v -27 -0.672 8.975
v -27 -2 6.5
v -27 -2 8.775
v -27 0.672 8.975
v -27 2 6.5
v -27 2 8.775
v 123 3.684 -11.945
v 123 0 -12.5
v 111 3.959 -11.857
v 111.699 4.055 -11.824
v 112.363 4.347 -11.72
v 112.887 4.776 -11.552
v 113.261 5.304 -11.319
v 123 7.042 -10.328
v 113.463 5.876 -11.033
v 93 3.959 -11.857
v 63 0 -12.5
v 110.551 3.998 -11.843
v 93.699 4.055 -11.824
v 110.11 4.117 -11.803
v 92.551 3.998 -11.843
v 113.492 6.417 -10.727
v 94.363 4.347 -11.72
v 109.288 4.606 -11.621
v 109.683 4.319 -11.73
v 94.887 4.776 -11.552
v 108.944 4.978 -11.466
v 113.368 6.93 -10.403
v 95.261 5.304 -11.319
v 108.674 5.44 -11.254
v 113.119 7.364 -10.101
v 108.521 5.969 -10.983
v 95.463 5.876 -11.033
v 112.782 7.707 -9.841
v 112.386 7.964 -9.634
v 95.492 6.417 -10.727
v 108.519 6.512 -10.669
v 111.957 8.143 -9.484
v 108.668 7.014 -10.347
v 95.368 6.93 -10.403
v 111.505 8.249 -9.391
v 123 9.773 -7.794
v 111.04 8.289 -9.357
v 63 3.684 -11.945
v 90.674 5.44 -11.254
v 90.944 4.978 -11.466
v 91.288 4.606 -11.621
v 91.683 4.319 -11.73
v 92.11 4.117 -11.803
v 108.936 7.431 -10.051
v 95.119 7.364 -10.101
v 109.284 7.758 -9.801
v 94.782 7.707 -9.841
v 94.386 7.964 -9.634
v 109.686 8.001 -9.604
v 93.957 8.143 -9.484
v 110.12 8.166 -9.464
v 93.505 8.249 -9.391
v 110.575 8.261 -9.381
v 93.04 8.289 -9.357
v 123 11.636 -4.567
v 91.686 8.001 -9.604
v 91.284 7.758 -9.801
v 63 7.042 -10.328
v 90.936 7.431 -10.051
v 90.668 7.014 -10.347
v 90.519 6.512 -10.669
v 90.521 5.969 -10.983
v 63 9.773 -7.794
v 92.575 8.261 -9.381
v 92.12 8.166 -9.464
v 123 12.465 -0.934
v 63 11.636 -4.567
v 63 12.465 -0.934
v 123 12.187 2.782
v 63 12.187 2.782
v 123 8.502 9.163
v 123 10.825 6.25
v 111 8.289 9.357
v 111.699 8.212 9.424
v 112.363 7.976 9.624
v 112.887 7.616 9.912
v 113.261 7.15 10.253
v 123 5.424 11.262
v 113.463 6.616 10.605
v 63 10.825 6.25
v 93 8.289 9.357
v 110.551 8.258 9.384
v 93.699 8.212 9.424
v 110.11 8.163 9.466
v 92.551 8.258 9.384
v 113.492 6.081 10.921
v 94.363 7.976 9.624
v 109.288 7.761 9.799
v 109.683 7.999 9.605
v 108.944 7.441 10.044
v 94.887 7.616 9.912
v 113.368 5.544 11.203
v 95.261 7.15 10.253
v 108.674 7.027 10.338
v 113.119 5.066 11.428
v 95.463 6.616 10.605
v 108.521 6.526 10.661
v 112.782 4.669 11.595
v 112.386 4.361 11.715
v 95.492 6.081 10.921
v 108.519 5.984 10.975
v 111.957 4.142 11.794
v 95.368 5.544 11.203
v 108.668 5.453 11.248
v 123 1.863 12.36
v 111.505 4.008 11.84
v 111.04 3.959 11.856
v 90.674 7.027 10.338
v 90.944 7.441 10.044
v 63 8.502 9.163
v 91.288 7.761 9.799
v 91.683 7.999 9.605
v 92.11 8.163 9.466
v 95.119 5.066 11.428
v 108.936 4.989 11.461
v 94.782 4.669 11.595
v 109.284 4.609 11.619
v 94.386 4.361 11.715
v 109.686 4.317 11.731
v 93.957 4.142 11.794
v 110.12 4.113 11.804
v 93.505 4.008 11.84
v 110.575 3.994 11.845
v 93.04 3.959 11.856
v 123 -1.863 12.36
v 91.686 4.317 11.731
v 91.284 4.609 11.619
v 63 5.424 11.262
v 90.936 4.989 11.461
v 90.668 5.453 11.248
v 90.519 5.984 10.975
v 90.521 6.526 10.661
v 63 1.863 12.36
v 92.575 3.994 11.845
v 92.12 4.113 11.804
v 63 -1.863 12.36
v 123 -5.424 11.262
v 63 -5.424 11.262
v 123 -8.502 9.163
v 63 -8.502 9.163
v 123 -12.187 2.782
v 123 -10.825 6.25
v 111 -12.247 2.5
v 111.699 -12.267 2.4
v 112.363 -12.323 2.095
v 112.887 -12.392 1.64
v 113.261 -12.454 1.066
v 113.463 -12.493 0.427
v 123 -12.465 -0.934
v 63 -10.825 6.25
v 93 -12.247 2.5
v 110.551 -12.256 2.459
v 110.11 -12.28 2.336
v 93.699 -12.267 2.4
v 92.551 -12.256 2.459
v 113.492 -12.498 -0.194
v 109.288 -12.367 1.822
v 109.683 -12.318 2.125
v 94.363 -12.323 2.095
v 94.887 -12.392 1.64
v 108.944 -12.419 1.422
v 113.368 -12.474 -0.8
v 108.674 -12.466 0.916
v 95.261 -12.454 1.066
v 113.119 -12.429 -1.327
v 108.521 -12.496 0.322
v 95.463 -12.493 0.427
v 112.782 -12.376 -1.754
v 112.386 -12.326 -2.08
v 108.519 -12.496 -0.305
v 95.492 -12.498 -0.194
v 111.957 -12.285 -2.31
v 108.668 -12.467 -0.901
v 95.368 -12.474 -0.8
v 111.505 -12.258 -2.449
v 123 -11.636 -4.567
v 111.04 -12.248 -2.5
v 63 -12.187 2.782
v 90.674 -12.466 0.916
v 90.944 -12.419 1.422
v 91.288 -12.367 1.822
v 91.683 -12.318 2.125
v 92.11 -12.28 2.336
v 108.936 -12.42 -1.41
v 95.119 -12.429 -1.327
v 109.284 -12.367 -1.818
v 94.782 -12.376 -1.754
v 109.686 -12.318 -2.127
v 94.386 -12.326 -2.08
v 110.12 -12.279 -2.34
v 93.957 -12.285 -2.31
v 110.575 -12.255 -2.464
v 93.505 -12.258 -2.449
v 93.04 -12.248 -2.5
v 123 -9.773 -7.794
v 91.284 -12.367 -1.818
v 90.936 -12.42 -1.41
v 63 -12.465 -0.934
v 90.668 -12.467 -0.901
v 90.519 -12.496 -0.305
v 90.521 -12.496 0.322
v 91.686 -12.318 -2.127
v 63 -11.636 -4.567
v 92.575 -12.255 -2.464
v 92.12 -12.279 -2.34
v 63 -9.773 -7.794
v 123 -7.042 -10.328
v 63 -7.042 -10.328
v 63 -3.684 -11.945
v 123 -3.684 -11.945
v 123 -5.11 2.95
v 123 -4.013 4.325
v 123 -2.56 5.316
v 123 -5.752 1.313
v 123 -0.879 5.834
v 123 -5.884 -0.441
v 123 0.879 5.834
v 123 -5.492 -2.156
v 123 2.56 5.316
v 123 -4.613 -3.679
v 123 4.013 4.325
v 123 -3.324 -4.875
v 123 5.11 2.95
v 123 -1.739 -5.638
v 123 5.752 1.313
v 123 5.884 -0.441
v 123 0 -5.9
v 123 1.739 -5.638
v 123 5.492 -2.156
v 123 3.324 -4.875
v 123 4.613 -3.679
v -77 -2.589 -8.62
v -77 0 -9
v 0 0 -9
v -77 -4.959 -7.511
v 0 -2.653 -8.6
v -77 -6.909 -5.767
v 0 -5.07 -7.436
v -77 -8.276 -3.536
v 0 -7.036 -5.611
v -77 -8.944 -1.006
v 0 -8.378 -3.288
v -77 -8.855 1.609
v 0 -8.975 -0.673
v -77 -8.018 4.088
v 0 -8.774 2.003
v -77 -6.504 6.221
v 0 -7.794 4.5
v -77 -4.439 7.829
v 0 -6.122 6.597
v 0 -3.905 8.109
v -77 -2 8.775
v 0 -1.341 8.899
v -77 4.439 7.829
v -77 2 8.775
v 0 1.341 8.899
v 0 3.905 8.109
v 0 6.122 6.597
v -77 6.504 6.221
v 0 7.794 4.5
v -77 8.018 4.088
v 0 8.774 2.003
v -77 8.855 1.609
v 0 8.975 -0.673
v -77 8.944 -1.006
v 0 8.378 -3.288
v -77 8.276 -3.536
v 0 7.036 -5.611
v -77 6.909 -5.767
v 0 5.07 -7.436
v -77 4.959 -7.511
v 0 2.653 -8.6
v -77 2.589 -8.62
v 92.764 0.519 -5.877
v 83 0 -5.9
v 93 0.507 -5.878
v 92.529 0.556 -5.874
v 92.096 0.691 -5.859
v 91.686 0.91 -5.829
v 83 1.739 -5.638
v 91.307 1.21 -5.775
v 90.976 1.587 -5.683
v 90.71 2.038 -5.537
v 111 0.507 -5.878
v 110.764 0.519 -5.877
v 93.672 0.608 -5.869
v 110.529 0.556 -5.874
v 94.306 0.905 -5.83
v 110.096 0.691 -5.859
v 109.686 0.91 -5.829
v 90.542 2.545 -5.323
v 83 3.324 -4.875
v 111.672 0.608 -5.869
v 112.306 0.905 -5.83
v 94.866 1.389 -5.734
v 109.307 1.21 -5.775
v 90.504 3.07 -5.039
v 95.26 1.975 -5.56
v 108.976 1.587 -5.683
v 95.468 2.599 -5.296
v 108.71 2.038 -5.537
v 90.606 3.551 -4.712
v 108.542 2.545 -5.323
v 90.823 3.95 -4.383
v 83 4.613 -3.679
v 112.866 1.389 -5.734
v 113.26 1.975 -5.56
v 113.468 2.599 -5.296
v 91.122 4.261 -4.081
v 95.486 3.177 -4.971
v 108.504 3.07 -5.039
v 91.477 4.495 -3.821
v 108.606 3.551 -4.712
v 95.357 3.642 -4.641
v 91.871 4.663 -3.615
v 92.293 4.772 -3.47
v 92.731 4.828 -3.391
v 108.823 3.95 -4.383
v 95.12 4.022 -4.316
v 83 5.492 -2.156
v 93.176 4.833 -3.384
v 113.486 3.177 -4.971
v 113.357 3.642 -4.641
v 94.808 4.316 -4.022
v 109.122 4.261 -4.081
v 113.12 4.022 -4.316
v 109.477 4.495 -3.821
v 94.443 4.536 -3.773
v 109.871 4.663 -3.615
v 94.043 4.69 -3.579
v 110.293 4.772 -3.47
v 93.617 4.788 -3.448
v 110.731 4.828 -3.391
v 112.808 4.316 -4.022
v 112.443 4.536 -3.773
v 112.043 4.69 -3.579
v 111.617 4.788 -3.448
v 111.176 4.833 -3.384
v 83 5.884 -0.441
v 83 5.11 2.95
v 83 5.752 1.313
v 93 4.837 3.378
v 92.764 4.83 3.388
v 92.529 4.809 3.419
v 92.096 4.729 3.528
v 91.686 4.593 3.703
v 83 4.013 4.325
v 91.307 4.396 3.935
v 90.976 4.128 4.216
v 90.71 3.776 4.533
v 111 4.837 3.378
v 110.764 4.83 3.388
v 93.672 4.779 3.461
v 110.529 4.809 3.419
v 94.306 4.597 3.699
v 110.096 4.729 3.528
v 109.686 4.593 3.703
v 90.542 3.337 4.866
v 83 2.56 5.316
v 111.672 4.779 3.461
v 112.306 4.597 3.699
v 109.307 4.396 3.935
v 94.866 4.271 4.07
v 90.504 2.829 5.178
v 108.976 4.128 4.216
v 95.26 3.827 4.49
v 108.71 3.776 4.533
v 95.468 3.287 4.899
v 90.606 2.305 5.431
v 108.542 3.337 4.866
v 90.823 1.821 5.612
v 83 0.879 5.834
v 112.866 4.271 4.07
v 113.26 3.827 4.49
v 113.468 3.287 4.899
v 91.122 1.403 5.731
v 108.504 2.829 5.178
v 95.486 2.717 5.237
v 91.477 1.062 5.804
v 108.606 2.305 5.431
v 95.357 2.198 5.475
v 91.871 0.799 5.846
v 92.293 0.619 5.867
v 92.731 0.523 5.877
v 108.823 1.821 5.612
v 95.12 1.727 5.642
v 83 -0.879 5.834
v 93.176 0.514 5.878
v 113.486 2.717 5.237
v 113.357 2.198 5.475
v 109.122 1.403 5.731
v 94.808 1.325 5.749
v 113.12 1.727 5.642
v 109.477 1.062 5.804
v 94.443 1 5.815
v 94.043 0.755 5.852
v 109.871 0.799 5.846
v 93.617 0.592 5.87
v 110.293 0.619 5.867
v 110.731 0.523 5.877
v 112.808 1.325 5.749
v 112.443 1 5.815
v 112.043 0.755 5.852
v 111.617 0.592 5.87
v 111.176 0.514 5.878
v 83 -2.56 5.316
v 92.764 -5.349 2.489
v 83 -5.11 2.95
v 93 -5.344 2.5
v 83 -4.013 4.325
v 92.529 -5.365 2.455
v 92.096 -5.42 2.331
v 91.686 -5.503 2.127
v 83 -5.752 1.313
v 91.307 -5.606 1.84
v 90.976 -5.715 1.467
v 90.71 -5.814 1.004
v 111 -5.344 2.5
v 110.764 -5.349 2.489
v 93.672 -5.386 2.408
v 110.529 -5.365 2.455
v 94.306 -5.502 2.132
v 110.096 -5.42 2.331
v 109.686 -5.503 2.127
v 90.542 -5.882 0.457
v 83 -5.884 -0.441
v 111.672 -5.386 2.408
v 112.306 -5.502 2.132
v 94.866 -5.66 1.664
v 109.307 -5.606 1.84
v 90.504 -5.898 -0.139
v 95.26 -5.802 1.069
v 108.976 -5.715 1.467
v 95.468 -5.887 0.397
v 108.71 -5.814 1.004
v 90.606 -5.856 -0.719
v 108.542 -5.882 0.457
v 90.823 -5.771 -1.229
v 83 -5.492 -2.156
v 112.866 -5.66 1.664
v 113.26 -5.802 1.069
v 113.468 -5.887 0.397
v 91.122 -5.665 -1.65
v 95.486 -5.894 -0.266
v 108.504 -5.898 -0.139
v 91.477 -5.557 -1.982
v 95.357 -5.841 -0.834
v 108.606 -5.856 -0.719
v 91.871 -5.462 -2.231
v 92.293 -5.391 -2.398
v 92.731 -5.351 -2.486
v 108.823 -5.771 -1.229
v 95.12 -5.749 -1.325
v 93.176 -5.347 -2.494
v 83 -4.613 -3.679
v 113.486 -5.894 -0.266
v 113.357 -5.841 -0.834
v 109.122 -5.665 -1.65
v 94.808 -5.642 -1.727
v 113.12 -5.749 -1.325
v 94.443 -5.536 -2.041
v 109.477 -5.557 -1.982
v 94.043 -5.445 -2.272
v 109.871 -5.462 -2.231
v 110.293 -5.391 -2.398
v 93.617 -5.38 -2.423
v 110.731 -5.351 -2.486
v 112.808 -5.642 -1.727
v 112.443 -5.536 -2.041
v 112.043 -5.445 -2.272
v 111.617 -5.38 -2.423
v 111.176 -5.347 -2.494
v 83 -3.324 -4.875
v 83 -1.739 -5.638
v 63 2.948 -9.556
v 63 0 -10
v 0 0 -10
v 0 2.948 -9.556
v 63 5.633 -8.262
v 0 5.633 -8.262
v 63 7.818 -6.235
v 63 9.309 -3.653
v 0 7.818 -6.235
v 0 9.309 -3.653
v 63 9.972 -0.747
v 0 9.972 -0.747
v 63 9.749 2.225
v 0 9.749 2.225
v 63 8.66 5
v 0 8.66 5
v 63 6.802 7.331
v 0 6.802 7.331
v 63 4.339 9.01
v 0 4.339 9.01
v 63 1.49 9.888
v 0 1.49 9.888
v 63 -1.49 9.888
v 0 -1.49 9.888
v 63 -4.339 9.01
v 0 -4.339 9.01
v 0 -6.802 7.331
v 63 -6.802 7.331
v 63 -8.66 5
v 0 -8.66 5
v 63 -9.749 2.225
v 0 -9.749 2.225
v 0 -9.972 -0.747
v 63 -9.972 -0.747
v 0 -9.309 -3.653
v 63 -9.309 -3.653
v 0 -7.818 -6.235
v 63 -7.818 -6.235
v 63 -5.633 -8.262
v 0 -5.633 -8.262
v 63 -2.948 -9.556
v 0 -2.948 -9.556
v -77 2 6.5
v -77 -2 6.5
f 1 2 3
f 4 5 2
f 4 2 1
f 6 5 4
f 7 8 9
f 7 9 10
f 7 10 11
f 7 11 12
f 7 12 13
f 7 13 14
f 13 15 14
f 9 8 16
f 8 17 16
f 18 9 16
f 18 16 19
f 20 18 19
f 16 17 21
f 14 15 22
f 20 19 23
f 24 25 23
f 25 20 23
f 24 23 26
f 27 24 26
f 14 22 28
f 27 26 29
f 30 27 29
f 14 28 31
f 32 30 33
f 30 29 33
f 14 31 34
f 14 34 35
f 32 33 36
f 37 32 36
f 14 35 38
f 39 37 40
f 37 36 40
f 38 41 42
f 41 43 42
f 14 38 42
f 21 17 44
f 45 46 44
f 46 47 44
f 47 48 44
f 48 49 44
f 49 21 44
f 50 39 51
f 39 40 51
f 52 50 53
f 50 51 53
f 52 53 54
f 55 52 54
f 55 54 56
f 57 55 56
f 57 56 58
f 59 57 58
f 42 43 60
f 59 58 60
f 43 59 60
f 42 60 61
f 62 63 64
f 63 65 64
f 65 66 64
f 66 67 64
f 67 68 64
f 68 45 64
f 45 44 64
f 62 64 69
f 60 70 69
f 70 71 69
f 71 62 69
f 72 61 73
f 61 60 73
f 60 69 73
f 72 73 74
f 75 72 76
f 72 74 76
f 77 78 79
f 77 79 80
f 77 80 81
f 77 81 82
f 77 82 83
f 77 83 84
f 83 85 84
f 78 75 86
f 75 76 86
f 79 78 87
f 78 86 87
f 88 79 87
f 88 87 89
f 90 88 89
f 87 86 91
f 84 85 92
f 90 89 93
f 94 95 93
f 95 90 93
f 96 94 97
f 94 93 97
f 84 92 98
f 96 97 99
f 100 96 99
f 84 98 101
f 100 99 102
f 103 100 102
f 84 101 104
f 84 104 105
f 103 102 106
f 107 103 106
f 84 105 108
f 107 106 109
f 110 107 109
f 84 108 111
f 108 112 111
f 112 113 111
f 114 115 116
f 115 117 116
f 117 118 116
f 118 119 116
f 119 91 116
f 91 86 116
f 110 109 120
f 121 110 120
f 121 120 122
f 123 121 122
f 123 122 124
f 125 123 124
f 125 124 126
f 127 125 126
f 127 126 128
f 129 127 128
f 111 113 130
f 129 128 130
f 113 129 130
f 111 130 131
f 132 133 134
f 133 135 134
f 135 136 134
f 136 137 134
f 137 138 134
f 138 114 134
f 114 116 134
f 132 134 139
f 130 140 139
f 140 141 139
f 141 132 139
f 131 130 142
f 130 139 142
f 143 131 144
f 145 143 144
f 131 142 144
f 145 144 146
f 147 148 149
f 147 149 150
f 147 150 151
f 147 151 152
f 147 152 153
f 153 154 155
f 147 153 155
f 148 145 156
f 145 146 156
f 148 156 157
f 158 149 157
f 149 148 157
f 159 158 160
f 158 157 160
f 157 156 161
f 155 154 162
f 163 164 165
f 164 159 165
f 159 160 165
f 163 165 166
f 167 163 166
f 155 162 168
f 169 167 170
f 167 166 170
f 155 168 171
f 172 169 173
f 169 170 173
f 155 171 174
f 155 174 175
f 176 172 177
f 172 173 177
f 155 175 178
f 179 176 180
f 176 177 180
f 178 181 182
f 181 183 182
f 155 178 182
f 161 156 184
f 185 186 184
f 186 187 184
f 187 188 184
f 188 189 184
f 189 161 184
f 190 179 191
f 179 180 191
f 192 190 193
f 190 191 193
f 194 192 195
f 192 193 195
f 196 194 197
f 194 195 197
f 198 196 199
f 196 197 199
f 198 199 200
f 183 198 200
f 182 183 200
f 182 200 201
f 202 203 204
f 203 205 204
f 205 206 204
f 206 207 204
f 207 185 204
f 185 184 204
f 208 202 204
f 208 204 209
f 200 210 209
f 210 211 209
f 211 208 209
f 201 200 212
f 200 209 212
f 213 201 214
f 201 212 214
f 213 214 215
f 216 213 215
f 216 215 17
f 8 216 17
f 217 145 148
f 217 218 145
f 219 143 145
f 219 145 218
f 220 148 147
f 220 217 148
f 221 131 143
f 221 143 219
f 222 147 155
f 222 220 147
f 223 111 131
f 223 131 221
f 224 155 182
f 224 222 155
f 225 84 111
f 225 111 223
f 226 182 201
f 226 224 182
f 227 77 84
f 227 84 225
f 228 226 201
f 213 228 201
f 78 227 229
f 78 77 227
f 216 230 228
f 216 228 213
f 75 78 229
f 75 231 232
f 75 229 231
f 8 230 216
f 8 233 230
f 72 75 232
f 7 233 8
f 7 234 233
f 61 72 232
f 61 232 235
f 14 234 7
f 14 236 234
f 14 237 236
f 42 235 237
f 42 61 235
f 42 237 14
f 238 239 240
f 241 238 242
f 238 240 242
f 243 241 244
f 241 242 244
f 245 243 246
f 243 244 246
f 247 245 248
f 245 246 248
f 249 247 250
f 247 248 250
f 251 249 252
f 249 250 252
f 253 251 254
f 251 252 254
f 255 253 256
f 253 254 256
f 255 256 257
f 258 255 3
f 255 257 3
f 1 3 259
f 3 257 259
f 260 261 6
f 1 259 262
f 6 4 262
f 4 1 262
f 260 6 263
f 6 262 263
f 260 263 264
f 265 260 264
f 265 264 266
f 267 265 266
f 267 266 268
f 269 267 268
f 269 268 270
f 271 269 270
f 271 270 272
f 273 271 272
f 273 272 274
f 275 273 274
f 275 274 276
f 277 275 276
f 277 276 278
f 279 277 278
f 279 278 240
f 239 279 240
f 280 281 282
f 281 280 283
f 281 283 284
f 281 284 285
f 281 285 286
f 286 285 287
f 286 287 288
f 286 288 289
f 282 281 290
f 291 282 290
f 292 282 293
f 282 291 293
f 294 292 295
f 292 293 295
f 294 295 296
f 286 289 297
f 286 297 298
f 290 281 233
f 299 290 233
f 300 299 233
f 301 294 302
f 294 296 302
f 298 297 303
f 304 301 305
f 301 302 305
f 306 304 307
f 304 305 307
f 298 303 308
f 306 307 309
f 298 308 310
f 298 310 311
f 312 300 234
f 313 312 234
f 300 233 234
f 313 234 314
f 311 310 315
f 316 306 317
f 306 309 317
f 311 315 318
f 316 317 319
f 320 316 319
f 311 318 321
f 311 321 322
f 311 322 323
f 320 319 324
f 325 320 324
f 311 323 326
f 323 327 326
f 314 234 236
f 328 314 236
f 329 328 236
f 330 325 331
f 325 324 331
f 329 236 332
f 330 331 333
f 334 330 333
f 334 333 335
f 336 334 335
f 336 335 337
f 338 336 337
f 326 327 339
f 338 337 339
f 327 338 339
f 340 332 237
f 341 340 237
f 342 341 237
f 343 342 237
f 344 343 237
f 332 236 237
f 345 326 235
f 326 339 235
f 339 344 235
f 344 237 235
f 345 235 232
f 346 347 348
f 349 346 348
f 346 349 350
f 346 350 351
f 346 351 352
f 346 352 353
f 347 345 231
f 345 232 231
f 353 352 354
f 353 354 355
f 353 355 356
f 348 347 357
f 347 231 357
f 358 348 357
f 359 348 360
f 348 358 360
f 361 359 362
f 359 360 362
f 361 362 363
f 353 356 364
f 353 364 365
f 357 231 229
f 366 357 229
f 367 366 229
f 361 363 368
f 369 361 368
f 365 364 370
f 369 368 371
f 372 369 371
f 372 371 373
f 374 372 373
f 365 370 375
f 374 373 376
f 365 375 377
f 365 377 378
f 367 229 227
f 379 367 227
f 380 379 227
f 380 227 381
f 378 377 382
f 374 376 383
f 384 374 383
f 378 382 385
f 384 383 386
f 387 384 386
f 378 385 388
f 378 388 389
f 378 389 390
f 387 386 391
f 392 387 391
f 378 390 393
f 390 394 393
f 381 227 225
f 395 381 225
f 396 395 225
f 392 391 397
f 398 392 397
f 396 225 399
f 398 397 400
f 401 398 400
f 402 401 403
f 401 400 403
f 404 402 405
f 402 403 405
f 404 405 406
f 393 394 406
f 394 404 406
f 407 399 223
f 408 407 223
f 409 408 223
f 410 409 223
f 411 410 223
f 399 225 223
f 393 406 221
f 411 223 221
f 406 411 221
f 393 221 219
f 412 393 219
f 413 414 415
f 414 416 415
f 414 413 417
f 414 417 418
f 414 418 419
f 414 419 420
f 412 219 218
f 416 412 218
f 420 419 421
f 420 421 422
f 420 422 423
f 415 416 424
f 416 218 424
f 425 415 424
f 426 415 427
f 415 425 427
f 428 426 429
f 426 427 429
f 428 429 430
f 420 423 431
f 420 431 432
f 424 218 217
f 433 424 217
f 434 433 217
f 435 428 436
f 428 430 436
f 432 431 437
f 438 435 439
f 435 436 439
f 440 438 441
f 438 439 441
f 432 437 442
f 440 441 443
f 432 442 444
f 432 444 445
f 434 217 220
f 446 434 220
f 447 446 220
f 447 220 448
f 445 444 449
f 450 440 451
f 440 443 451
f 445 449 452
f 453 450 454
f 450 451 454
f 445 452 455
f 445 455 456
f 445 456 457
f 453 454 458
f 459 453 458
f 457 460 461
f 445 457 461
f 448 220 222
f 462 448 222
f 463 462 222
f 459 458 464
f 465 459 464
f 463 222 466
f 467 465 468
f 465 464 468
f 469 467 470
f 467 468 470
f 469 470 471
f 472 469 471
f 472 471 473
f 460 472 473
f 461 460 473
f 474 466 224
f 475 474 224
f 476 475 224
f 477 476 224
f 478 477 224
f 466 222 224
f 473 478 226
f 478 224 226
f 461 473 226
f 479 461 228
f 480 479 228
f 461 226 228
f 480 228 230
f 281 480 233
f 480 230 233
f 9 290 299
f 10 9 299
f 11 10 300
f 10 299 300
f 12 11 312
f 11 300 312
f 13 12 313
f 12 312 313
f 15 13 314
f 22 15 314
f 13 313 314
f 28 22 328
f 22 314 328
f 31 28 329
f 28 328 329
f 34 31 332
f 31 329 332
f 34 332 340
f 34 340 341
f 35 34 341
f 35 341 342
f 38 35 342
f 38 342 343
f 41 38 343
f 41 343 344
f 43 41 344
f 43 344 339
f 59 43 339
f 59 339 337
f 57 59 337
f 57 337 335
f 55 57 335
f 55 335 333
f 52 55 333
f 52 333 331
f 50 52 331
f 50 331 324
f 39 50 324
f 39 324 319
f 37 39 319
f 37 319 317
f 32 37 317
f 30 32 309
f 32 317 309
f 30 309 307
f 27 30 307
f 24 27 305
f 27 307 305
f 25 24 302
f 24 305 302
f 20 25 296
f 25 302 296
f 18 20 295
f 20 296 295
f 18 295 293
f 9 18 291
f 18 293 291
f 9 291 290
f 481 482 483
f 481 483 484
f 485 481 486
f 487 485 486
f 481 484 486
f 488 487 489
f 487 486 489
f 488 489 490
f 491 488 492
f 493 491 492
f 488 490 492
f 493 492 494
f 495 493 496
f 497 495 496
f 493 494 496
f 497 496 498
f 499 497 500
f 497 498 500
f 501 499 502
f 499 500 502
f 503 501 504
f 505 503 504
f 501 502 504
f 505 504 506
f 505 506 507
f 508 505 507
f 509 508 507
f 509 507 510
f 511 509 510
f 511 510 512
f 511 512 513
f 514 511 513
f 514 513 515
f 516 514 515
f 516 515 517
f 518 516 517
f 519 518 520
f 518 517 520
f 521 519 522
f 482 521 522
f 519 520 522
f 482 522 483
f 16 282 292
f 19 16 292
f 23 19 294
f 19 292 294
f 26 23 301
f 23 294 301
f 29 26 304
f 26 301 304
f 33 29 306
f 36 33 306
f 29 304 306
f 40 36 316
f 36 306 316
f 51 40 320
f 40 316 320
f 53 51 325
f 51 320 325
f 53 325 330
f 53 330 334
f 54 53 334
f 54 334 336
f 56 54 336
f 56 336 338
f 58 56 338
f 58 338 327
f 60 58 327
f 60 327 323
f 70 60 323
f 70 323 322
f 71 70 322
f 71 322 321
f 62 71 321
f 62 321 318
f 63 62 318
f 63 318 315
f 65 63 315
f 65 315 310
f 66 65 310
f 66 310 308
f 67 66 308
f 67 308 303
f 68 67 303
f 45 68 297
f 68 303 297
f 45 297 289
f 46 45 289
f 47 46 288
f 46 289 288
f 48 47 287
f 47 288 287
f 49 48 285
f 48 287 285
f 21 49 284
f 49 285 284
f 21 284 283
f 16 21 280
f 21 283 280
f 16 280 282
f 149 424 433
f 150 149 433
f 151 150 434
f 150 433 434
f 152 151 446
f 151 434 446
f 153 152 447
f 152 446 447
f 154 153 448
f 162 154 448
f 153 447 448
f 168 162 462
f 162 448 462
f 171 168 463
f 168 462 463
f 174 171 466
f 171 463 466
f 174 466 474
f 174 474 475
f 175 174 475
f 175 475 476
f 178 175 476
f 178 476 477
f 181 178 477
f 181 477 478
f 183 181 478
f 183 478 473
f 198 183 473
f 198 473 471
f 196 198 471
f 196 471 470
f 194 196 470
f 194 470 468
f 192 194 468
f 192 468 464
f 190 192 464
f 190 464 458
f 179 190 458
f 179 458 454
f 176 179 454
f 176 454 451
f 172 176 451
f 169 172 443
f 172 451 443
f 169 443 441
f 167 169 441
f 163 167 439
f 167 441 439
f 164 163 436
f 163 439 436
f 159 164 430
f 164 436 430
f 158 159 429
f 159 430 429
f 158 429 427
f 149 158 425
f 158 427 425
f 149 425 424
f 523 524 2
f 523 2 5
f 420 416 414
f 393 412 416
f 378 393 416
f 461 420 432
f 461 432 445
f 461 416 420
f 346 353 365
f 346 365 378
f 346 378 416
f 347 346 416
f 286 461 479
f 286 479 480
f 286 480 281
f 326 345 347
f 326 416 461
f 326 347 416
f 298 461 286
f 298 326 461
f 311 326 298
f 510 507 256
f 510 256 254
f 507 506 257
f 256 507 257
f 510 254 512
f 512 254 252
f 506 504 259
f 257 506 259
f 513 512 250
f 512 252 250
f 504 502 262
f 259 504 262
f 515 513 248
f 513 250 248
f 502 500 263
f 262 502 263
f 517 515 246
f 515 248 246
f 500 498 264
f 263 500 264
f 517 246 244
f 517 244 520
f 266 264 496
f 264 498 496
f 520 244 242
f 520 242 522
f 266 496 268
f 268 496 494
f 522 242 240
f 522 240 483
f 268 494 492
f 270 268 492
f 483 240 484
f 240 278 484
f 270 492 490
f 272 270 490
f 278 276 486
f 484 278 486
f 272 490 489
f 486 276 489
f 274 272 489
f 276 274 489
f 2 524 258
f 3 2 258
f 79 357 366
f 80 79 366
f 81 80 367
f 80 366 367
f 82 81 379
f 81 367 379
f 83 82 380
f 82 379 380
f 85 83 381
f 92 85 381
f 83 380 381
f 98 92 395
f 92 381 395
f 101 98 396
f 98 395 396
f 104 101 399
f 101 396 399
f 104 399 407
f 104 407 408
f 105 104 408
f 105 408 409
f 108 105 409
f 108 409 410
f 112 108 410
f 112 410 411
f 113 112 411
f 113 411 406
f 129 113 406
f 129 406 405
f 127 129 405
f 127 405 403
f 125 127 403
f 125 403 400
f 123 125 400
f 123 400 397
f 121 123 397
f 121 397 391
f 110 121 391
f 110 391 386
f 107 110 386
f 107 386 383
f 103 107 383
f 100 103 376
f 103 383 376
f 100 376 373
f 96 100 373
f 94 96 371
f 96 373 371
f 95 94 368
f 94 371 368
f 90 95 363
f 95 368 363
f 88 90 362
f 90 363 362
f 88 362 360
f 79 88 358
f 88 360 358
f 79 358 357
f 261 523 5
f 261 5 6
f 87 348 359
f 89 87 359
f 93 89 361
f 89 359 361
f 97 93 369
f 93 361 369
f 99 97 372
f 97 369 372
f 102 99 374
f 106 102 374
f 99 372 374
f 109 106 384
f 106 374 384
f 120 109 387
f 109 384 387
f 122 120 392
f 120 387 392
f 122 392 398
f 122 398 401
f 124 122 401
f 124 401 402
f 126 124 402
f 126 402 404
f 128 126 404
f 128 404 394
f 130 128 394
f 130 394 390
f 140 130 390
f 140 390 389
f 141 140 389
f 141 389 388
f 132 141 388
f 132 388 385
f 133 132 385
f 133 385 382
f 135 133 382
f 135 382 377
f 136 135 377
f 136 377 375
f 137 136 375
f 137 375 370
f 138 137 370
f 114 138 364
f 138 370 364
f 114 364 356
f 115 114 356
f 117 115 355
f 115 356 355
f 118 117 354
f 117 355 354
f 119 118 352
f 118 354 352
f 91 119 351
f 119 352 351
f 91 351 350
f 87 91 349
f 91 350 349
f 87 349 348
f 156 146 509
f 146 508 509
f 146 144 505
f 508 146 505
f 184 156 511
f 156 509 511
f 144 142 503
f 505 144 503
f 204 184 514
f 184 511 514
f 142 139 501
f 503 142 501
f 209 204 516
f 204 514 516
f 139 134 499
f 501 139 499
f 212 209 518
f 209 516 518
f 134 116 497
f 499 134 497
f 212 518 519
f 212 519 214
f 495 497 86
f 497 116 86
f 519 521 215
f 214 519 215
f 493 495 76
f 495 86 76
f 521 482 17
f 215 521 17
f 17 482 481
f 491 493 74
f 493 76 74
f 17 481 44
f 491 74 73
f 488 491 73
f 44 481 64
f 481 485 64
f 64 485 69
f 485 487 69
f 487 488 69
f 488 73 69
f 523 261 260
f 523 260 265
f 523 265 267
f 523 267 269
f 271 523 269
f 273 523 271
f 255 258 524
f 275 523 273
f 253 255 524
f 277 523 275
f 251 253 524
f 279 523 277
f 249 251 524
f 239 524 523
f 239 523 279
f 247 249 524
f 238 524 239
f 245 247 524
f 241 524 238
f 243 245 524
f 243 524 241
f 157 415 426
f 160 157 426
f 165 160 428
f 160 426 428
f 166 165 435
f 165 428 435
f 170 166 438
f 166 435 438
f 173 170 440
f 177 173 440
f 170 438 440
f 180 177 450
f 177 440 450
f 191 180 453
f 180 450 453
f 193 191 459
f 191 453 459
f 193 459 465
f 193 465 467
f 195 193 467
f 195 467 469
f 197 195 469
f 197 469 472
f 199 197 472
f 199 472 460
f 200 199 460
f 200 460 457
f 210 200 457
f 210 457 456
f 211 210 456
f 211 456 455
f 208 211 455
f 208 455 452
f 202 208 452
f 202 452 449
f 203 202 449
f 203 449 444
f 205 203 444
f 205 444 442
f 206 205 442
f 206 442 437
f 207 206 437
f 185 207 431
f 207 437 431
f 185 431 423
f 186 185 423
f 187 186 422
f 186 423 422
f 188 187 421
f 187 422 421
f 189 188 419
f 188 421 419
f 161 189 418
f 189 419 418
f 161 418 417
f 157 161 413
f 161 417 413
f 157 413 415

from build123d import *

# Parameters (mm, degrees)
SKETCH2_R           = 10
BOSS_EXTRUDE1_DEPTH = 63
SKETCH3_R           = 12.5
BOSS_EXTRUDE2_DEPTH = 60
SKETCH5_R           = 5.9
CUT_EXTRUDE1_DEPTH  = 40
SKETCH6_R           = 2.5
CUT_EXTRUDE2_DEPTH  = 55
CIRPATTERN1_COUNT   = 3
SKETCH8_R           = 9
BOSS_EXTRUDE3_DEPTH = 77
SKETCH9_W           = 3.883559786
SKETCH9_H           = 4
CUT_EXTRUDE3_DEPTH  = 50


with BuildPart() as part:
    # Sketch2 → Boss-Extrude1 (new body)
    with BuildSketch(Plane(origin=(0, 0, 0), x_dir=(0, 0, -1), z_dir=(1, 0, 0))):
        Circle(SKETCH2_R)
    extrude(amount=BOSS_EXTRUDE1_DEPTH)

    # Sketch3 → Boss-Extrude2 (add)
    with BuildSketch(Plane(origin=(63, 0, 0), x_dir=(0, 0, -1), z_dir=(1, 0, 0))):
        Circle(SKETCH3_R)
    extrude(amount=BOSS_EXTRUDE2_DEPTH)

    # Sketch5 → Cut-Extrude1 (cut)
    with BuildSketch(Plane(origin=(123, 0, 0), x_dir=(0, 0, -1), z_dir=(1, 0, 0))):
        Circle(SKETCH5_R)
    extrude(amount=-CUT_EXTRUDE1_DEPTH, mode=Mode.SUBTRACT)

    # Sketch6 → Cut-Extrude2 (cut)
    with BuildSketch(Plane(origin=(0, 0, 0), x_dir=(1, 0, 0), z_dir=(0, 1, 0))):
        with Locations(Location((93, 0, 0), (0, 0, 270))):
            Circle(SKETCH6_R)
        with Locations(Location((111, 0, 0), (0, 0, 270))):
            Circle(SKETCH6_R)
    cut_extrude2 = extrude(amount=-CUT_EXTRUDE2_DEPTH, mode=Mode.SUBTRACT)

    # CirPattern1: Cut-Extrude2 ×3 about axis
    cirpattern1_axis = Axis((123, 0, 0), (1, 0, 0))
    for i in range(1, CIRPATTERN1_COUNT):
        add(cut_extrude2.rotate(cirpattern1_axis, i * 360 / CIRPATTERN1_COUNT), mode=Mode.SUBTRACT)

    # Sketch8 → Boss-Extrude3 (add)
    with BuildSketch(Plane.ZY):
        with Locations(Location((0, 0, 0), (0, 0, 180))):
            Circle(SKETCH8_R)
    extrude(amount=BOSS_EXTRUDE3_DEPTH)

    # Sketch9 → Cut-Extrude3 (cut)
    with BuildSketch(Plane.ZY.offset(77)):
        with Locations((8.441779893, 0)):
            Rectangle(SKETCH9_W, SKETCH9_H)
    extrude(amount=-CUT_EXTRUDE3_DEPTH, mode=Mode.SUBTRACT)


solid = part.part
